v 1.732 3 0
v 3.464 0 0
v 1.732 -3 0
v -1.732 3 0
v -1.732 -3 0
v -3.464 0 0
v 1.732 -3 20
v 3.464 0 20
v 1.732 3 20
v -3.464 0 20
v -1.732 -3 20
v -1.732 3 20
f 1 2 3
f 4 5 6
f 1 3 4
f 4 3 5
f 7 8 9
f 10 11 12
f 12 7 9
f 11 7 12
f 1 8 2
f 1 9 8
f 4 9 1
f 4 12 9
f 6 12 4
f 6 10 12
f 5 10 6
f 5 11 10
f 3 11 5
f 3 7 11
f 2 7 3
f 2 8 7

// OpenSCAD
height = 20;
// 6.35 is exactly 1/4". Make it undersized so it will slip out.
distance_across_flats = 6;

linear_extrude(20) circle(distance_across_flats / 2 / cos(30), $fn = 6);
